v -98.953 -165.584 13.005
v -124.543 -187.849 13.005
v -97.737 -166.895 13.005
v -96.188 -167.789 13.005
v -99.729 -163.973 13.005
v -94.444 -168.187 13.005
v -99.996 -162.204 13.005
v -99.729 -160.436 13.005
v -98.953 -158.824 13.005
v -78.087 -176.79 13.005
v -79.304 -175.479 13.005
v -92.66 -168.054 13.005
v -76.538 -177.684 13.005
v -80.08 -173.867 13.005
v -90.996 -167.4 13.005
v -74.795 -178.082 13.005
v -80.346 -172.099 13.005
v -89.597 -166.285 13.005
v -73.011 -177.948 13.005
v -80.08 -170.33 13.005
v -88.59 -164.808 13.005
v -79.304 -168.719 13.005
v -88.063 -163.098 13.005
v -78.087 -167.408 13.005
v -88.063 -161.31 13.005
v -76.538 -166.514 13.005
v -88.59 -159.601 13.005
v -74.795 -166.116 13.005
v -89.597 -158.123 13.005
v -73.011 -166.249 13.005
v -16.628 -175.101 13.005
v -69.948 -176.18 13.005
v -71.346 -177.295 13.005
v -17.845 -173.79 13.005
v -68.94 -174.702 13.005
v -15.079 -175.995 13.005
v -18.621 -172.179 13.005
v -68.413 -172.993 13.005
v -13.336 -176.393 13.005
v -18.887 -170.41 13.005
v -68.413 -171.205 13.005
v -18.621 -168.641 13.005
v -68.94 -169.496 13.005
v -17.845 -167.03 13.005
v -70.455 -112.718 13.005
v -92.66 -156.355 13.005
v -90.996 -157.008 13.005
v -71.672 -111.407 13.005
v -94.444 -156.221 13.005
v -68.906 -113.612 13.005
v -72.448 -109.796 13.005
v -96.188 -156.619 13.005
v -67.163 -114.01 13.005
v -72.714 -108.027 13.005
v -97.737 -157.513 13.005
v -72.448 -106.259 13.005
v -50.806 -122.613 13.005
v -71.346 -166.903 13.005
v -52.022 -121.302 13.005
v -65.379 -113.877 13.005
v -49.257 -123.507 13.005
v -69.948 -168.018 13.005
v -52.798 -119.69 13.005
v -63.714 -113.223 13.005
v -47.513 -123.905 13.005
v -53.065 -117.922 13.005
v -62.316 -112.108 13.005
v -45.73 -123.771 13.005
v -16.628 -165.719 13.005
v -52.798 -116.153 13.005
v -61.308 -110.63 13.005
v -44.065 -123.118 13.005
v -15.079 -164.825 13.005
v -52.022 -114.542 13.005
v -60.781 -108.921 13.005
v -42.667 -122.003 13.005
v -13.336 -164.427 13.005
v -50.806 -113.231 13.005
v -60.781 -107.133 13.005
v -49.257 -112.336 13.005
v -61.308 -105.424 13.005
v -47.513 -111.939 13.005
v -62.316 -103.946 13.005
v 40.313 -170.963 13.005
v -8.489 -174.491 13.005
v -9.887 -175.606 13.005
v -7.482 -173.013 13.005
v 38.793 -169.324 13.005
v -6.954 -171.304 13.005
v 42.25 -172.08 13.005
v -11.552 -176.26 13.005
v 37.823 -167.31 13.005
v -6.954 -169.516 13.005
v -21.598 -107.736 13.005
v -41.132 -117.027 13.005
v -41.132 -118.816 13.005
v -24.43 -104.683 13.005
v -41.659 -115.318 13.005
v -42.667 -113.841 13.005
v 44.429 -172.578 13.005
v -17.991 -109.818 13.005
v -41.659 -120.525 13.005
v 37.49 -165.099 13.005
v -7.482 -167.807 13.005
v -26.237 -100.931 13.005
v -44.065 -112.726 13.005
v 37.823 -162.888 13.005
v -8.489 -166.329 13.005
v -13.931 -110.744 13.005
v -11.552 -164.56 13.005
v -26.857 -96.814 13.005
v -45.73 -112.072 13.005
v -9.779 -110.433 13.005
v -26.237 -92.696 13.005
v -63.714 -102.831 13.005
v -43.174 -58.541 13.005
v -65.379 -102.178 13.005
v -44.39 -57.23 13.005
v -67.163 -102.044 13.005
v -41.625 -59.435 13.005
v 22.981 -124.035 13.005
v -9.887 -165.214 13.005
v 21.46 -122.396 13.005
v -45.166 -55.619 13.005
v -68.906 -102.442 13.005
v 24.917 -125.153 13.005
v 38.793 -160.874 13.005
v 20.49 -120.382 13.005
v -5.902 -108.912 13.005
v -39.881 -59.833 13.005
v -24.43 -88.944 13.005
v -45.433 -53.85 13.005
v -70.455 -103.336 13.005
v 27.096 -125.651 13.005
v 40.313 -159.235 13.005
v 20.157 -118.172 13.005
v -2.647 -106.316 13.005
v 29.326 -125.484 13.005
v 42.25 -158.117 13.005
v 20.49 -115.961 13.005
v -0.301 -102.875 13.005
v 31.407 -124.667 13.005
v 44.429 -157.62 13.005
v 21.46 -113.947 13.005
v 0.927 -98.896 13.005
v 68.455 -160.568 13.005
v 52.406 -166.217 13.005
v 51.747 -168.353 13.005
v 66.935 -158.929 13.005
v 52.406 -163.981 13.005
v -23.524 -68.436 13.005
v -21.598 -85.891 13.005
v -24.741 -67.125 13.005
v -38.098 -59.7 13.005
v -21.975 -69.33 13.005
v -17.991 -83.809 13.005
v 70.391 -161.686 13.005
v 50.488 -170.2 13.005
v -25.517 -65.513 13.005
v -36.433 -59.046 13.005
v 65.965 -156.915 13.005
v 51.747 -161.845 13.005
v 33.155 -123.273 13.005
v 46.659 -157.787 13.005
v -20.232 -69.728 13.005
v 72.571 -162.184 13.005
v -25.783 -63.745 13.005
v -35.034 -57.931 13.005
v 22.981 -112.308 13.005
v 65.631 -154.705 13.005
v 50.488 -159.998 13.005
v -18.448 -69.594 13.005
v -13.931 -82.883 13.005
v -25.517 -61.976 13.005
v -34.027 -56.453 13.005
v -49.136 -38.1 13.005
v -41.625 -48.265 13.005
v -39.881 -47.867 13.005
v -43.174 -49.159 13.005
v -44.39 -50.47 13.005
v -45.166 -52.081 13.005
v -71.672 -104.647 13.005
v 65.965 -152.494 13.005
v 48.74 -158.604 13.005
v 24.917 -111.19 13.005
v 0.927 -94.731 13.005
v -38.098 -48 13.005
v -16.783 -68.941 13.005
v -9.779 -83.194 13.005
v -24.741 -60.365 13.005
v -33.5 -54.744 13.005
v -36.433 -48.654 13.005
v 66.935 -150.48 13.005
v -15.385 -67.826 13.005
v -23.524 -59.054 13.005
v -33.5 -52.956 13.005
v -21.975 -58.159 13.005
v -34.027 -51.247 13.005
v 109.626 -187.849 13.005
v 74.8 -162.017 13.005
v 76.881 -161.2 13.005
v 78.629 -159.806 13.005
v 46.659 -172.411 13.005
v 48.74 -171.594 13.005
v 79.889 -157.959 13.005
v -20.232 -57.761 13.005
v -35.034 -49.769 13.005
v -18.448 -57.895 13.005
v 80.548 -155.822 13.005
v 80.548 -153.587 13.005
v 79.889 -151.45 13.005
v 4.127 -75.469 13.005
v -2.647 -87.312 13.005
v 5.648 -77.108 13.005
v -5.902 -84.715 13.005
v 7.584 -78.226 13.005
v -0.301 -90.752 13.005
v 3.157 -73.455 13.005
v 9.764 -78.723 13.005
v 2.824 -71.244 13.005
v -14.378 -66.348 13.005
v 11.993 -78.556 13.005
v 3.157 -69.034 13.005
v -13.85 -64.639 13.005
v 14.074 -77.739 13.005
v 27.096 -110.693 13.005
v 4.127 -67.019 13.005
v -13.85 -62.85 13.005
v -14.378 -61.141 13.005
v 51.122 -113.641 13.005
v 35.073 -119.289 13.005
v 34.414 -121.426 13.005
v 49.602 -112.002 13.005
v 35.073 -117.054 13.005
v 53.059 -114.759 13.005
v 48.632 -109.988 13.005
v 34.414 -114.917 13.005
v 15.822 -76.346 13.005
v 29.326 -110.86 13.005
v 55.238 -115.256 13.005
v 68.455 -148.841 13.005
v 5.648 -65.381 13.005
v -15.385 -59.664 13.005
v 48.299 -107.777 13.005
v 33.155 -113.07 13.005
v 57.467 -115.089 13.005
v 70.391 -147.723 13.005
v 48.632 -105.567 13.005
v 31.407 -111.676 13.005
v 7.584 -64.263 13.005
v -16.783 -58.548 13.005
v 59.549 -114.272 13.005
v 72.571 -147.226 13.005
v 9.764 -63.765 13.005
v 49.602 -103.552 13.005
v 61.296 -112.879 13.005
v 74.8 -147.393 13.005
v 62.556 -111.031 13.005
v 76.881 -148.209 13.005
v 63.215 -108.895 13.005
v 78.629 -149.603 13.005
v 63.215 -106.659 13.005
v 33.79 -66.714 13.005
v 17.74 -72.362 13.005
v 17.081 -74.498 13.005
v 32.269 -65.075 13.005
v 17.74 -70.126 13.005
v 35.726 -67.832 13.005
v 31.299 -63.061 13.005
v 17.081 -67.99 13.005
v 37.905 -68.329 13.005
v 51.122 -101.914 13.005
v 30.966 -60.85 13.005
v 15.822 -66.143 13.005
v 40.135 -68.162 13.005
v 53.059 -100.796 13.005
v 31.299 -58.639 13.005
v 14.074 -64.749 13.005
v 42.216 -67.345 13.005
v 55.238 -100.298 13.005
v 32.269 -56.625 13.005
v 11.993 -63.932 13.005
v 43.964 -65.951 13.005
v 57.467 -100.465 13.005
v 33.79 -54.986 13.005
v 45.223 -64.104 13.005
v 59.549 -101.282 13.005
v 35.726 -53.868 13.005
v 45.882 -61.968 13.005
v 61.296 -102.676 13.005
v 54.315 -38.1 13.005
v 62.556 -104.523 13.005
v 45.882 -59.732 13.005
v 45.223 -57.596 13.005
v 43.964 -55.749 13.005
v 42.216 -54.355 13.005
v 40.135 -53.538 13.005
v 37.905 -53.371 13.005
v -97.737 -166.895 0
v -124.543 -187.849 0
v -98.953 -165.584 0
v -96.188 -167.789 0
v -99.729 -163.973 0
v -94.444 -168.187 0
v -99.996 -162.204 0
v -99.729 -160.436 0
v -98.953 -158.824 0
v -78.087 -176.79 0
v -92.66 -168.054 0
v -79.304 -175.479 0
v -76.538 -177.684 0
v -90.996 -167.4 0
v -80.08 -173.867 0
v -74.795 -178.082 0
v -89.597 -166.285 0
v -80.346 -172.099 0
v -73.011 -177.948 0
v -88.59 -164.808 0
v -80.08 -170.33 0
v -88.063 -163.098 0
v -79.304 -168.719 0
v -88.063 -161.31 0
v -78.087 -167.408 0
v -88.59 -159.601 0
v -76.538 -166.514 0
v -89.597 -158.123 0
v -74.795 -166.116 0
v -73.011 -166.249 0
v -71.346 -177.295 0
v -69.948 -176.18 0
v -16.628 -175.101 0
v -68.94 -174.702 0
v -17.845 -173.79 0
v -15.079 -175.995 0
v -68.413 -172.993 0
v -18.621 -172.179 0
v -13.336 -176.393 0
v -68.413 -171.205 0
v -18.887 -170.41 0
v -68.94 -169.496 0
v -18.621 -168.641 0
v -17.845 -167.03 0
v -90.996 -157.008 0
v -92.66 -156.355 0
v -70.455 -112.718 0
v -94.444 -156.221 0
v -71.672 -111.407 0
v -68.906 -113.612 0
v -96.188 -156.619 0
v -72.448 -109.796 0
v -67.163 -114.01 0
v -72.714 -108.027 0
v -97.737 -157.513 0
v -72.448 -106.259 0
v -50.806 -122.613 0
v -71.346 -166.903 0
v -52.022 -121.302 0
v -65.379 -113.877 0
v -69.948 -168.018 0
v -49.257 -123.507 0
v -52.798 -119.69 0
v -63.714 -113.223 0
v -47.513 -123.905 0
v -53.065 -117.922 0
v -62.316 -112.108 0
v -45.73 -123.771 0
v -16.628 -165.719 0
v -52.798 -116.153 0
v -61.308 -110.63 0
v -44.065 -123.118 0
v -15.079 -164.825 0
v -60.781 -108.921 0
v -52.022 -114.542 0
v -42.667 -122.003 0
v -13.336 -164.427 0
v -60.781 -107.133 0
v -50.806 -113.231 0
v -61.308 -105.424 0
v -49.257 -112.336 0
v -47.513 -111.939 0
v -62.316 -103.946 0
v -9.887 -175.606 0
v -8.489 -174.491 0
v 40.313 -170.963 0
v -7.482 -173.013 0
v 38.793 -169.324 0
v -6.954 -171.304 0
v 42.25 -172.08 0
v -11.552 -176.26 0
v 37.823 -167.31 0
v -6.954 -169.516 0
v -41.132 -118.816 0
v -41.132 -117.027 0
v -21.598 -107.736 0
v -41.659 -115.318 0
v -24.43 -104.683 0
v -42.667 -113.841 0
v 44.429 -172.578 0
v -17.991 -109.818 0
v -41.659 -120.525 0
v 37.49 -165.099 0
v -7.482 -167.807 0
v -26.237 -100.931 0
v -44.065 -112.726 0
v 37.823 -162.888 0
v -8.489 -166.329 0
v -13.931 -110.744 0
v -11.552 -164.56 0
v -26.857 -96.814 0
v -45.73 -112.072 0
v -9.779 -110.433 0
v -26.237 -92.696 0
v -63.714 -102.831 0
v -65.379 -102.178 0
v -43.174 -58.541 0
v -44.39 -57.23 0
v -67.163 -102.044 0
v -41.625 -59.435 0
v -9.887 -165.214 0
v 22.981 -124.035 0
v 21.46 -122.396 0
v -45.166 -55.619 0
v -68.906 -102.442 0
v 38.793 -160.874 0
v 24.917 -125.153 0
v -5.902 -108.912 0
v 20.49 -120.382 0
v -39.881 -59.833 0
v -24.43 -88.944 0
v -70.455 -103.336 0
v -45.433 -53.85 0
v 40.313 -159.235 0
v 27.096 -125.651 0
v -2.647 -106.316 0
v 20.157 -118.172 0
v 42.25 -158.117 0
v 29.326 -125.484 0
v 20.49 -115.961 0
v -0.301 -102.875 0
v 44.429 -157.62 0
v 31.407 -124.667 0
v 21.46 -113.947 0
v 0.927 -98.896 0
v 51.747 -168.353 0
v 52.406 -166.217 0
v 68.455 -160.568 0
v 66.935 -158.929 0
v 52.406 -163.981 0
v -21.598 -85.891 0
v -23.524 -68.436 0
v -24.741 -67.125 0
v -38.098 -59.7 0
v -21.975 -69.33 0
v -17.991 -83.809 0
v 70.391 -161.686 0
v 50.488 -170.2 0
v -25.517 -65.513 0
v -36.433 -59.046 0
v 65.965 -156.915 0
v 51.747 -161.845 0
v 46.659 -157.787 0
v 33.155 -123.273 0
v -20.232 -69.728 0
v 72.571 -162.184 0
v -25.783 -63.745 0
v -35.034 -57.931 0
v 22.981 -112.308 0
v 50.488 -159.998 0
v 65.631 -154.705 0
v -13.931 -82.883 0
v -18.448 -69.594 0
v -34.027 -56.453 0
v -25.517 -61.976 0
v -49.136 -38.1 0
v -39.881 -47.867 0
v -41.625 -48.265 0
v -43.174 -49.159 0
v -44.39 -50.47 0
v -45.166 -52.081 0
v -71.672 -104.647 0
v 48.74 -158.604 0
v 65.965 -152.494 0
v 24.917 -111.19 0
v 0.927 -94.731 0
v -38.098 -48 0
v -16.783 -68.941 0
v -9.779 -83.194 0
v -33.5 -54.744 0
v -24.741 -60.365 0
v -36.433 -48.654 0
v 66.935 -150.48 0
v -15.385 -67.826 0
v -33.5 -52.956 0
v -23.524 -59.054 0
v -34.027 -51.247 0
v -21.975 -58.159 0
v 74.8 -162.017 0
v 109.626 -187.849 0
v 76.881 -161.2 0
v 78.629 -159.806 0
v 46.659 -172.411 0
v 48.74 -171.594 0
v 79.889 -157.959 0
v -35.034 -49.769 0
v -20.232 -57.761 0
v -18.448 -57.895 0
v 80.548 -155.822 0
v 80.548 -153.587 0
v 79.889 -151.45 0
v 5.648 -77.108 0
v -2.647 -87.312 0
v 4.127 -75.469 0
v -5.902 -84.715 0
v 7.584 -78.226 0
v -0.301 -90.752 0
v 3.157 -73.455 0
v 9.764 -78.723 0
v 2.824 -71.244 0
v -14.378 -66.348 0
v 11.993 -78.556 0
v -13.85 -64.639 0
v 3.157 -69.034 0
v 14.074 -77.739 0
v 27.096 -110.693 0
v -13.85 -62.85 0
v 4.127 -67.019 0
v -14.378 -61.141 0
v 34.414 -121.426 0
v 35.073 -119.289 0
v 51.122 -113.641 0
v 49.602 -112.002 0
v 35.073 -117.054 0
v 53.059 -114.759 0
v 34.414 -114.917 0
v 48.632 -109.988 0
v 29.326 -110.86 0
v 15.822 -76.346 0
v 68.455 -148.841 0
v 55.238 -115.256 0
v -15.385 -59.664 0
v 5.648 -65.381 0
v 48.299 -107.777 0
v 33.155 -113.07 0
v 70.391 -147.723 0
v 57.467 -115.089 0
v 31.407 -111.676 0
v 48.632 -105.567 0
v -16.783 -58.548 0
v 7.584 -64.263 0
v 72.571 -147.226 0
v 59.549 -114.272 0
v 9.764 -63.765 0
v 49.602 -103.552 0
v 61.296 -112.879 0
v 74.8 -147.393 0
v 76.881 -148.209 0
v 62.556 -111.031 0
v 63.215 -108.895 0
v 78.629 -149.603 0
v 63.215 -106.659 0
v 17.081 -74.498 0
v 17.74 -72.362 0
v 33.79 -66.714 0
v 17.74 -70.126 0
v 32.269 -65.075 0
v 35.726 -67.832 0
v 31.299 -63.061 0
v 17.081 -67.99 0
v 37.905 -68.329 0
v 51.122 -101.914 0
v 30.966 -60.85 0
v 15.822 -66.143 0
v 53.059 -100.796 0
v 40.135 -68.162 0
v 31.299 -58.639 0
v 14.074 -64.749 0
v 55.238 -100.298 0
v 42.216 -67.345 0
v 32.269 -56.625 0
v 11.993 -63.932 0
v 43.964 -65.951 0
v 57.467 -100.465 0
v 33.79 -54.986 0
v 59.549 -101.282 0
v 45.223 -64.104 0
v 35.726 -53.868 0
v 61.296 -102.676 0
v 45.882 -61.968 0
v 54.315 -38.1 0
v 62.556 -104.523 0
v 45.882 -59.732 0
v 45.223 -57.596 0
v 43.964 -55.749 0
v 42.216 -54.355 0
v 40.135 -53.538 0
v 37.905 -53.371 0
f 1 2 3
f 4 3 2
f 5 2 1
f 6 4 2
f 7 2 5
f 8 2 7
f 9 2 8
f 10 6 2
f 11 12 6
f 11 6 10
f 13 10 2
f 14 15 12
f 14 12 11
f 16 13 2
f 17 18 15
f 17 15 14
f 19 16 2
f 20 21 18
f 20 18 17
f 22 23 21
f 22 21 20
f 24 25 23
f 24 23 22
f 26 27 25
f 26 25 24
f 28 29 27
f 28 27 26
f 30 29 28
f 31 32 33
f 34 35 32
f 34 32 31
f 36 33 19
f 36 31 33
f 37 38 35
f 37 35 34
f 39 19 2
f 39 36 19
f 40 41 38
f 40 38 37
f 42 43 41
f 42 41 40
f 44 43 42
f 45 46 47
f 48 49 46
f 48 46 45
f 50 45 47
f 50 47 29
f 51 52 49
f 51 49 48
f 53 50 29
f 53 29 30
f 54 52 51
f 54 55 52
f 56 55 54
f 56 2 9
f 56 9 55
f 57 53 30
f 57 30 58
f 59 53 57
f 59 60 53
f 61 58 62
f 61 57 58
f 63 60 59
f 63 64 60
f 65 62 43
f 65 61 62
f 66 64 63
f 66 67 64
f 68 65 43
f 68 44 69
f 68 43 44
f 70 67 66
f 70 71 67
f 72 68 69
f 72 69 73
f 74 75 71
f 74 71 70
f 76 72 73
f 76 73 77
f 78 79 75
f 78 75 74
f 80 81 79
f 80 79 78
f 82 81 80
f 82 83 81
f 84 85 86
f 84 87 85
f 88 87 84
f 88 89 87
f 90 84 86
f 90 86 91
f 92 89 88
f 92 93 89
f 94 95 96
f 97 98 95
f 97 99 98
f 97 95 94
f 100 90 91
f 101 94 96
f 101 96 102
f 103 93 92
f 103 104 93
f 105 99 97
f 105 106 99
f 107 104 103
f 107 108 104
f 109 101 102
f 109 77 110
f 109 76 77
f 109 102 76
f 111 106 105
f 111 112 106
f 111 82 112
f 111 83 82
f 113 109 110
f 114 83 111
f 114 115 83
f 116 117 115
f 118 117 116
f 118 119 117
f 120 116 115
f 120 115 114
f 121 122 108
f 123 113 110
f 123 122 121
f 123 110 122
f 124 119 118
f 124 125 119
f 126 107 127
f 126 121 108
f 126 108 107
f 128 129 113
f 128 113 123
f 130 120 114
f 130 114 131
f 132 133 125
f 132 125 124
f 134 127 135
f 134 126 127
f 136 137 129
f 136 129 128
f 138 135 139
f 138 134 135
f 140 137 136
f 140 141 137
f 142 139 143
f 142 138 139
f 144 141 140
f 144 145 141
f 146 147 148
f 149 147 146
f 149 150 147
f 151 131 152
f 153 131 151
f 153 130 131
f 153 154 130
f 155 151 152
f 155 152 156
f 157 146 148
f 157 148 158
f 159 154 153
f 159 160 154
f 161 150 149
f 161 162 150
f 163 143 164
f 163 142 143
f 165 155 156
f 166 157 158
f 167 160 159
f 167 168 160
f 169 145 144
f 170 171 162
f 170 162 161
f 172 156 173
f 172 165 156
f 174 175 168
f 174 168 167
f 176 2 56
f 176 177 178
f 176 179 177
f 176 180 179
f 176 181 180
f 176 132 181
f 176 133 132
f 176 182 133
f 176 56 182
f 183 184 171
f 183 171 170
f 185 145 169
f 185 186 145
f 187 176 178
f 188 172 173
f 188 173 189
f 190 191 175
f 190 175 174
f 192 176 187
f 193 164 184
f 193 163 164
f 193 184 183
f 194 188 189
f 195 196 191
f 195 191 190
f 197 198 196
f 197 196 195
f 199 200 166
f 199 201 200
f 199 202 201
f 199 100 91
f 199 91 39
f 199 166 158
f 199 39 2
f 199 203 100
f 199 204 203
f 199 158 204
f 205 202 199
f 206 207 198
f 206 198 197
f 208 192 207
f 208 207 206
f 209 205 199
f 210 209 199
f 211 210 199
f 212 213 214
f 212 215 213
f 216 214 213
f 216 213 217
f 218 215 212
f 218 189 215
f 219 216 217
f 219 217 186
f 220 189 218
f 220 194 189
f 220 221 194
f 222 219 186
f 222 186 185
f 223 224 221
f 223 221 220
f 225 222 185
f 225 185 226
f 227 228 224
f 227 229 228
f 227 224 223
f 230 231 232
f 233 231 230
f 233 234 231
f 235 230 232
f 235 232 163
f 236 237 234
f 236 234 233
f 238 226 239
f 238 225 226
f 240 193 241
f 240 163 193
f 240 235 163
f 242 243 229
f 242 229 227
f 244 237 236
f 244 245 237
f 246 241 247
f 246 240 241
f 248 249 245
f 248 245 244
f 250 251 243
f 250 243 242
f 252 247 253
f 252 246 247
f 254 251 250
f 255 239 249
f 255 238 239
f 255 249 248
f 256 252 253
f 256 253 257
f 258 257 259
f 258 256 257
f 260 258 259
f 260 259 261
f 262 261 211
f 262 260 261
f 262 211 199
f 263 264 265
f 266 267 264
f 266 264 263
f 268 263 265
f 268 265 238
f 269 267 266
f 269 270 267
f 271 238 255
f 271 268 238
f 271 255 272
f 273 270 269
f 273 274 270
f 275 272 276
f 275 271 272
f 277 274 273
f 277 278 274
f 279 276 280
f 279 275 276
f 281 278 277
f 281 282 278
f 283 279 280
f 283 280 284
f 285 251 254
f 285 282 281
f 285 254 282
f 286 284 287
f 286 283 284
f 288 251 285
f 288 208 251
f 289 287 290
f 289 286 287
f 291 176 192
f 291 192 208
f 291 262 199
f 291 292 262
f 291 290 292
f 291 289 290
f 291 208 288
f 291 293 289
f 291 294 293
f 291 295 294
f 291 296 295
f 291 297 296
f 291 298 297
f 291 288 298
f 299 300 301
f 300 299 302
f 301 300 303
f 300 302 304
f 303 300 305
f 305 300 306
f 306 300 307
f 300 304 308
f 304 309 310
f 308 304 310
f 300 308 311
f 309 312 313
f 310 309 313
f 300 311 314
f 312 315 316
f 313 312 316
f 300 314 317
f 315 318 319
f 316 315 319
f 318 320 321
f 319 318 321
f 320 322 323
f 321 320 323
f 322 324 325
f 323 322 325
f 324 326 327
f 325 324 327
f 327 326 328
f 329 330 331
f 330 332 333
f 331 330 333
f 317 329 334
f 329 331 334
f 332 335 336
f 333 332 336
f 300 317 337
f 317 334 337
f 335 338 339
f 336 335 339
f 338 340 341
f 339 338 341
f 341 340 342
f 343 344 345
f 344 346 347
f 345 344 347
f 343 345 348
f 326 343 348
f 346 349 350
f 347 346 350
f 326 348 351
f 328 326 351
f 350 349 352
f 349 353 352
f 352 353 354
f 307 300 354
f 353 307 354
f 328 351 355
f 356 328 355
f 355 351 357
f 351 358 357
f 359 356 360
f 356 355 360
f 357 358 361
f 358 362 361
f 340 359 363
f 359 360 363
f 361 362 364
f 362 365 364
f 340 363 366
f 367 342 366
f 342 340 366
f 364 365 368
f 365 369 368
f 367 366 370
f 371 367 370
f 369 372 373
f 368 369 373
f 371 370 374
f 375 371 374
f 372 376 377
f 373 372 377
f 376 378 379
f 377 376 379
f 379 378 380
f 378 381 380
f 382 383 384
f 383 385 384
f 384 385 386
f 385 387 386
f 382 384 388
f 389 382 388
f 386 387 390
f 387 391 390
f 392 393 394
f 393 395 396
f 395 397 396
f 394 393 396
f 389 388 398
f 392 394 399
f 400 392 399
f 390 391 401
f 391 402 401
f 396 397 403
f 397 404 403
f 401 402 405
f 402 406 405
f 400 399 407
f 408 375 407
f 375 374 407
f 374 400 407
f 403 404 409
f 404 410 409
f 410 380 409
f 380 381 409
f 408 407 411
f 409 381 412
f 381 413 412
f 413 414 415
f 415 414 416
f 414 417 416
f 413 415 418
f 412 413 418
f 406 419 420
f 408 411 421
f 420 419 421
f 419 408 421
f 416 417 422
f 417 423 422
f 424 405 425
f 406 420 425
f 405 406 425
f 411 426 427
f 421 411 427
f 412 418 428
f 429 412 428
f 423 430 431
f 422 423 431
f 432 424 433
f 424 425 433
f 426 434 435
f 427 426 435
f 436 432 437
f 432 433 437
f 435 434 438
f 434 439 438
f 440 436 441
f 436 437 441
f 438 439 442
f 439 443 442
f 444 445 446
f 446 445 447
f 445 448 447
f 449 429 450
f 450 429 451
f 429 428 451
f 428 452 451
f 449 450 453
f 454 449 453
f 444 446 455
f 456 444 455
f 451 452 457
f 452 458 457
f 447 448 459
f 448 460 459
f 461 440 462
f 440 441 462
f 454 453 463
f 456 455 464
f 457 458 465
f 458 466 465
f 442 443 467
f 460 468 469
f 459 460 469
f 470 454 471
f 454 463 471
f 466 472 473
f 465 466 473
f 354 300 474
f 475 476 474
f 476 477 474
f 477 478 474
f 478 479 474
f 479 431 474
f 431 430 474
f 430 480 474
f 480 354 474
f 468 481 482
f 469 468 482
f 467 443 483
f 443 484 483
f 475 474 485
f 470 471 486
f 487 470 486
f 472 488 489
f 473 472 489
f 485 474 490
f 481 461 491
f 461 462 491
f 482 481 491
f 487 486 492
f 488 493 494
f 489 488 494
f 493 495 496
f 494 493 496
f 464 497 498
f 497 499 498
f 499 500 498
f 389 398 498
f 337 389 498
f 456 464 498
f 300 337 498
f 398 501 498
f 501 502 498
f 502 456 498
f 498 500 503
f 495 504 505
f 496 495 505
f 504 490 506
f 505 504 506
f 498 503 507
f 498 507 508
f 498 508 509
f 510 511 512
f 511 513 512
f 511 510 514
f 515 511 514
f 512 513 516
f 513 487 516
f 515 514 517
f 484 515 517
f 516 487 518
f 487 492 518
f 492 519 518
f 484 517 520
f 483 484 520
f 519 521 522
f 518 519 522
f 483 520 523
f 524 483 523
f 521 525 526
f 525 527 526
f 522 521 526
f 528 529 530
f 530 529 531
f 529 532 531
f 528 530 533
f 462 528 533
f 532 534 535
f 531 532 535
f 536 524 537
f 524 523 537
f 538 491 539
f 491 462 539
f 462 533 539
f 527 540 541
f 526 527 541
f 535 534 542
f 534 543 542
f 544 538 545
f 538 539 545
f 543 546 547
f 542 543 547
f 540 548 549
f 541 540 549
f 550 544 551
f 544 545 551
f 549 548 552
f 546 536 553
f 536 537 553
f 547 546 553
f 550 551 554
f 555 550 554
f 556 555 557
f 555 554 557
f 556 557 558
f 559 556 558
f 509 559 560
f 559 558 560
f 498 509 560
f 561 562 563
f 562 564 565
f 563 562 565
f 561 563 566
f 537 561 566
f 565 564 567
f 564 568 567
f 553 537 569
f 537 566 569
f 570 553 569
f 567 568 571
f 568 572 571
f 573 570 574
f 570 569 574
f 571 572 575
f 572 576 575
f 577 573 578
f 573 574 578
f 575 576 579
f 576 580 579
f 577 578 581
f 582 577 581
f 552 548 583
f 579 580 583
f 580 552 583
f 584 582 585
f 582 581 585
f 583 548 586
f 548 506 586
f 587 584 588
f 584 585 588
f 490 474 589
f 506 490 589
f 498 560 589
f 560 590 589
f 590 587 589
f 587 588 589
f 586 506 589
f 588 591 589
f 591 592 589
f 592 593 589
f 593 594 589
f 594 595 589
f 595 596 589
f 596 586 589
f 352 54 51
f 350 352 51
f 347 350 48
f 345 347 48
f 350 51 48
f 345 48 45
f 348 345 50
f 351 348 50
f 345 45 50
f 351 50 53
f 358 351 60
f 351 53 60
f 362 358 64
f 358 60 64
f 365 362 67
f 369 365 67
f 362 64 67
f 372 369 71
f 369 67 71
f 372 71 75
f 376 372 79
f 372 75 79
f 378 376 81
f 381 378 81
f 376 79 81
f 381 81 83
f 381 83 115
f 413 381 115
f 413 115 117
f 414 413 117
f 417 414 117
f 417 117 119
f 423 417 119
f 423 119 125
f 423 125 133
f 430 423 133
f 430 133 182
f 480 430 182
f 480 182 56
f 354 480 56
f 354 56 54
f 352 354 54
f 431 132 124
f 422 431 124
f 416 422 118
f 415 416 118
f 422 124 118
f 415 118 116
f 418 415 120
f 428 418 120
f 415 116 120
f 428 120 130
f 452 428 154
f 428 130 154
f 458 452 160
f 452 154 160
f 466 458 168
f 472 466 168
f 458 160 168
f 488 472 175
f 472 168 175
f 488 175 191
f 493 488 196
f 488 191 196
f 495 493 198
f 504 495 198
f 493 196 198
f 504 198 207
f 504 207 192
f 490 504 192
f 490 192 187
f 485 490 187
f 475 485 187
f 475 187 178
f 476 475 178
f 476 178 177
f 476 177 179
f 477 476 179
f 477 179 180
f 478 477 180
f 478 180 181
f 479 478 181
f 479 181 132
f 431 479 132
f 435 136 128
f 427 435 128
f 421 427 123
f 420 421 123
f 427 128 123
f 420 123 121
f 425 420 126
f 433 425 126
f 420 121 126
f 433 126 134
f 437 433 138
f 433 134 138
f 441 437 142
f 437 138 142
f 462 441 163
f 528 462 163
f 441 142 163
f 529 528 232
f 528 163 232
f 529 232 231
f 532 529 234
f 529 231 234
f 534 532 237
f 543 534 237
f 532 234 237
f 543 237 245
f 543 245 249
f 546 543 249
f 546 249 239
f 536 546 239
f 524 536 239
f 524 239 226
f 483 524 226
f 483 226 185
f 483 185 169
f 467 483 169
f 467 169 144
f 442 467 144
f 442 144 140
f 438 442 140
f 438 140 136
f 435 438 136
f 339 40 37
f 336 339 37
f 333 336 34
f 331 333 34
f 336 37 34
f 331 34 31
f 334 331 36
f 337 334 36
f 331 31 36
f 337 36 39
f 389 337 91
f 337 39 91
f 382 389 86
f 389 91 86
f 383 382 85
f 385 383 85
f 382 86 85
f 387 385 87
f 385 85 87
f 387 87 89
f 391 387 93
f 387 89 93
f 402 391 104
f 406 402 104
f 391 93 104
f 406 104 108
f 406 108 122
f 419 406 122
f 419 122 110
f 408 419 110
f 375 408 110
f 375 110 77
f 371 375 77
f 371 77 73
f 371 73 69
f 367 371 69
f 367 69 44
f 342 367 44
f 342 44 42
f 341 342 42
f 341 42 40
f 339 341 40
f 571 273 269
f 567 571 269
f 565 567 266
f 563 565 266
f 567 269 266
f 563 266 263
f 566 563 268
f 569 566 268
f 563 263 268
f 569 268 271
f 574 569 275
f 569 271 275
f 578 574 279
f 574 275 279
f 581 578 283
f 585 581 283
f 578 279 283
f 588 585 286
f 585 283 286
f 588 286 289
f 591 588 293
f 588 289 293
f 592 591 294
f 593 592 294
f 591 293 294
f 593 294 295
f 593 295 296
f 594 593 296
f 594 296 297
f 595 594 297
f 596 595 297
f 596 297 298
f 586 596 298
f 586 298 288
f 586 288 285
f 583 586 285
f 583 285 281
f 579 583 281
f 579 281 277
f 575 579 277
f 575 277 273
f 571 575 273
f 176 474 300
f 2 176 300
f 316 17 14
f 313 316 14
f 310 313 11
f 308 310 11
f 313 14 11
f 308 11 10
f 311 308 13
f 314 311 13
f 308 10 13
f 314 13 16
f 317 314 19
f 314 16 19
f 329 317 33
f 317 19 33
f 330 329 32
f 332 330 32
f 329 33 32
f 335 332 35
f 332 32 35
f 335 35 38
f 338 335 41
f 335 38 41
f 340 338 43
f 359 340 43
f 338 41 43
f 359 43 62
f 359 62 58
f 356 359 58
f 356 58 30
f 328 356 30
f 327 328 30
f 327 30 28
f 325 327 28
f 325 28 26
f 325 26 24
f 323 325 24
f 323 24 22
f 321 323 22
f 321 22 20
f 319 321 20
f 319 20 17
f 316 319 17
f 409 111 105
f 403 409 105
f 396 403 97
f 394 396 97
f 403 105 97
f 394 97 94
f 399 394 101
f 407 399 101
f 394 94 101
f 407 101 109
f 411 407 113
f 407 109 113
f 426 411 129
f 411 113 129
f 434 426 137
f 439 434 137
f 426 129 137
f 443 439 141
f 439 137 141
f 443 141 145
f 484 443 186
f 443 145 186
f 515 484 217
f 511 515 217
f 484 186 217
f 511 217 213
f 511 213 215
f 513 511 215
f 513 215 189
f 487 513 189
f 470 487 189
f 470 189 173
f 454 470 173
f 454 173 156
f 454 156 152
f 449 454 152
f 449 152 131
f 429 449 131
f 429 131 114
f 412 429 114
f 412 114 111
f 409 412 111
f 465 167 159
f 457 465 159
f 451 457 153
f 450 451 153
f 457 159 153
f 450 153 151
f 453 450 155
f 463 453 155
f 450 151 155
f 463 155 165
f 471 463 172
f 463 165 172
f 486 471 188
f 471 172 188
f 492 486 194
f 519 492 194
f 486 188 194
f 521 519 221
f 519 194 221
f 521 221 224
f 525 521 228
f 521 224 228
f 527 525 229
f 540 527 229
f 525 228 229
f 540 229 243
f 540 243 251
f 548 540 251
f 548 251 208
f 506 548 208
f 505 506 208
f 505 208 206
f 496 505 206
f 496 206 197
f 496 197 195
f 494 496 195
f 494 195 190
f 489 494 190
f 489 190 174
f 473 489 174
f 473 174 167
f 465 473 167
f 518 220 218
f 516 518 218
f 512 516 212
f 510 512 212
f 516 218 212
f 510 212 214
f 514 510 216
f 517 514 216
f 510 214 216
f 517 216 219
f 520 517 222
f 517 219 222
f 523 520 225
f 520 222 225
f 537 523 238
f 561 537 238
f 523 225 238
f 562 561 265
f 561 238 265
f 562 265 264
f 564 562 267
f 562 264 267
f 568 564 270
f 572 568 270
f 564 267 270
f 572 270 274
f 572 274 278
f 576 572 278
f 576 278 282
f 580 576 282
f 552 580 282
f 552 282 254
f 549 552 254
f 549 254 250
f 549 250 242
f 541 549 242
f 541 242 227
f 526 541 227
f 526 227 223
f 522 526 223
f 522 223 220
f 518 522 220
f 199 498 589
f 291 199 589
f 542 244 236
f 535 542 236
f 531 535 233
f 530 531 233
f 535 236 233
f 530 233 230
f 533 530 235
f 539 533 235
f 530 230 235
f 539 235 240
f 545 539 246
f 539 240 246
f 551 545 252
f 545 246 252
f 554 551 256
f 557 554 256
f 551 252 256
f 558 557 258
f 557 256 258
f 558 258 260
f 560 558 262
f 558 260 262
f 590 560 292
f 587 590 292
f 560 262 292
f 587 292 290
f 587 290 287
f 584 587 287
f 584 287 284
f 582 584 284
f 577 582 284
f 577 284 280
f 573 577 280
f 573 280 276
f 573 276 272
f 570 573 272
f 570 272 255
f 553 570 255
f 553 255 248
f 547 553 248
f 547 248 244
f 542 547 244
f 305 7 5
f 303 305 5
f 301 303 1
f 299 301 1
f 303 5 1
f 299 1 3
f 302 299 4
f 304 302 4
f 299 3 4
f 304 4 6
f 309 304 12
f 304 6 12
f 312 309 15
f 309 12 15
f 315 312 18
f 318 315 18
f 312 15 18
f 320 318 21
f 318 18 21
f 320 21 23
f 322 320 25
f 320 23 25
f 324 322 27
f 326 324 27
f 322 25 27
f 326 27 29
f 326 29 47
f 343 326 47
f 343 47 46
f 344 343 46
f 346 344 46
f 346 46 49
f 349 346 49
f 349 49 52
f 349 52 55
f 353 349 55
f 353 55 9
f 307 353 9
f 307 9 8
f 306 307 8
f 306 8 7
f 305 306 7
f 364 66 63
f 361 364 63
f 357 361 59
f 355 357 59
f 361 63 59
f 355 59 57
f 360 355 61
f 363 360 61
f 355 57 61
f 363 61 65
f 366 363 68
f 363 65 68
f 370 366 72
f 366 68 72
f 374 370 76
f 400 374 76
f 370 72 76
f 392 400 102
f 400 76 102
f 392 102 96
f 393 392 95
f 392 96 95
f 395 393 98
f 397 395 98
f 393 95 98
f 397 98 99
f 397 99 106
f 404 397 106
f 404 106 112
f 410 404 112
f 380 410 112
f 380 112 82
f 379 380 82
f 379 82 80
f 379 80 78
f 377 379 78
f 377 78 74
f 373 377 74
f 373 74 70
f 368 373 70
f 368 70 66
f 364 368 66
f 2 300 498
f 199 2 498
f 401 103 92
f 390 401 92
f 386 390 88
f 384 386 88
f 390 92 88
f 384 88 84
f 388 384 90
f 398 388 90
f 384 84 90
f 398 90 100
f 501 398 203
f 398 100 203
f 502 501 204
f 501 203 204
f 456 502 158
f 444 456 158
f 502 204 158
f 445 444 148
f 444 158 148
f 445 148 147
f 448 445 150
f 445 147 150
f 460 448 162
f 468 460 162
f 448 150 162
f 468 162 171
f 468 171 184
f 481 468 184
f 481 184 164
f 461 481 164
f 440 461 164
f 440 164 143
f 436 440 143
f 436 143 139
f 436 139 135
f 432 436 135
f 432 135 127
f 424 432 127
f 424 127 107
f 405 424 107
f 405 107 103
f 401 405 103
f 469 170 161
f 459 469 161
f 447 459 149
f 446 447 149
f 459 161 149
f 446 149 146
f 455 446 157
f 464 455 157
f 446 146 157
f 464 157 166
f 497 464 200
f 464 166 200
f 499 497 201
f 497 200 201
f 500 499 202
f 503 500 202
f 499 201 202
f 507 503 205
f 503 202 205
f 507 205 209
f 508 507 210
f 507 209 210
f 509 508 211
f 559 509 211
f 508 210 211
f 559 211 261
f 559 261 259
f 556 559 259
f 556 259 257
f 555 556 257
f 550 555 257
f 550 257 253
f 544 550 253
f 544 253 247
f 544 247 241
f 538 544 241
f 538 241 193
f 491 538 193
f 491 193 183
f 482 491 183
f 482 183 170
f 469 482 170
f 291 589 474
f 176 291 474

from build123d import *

# Parameters (mm, degrees)
F3_DEPTH = 13.0048
F4_D     = 15
F5_D     = 12
F6_D     = 27.94


with BuildPart() as f3:
    # F2 (on Top) → F3 (new body)
    with BuildSketch(Plane.XY):
        Polygon((54.3151245746, -38.1), (-49.1357887106, -38.1), (-124.5434206745, -187.848847558), (109.6256415023, -187.848847558), align=None)
    extrude(amount=F3_DEPTH)

    # F4 (through all)
    with Locations(Plane(origin=(0, 0, 0), x_dir=(1, 0, 0), z_dir=(0, 0, -1))):
        with Locations((38.4657377694, 60.85), (10.3239816143, 71.2443042339), (27.6568138595, 118.1715758959), (55.7985700146, 107.777271662), (44.9896461047, 165.098847558), (73.1314022598, 154.7045433241)):
            Hole(F4_D / 2)

    # F5 (through all)
    with Locations(Plane(origin=(0, 0, 0), x_dir=(1, 0, 0), z_dir=(0, 0, -1))):
        with Locations((-19.7833501507, 63.7446313346), (-39.4326827285, 53.85), (-66.7141442955, 108.0271081117), (-47.0648117177, 117.9217394463), (-74.3462732846, 172.098847558), (-93.9956058624, 162.2042162234), (-12.8873561721, 170.4100188799)):
            Hole(F5_D / 2)

    # F6 (through all)
    with Locations(Plane(origin=(0, 0, 0), x_dir=(1, 0, 0), z_dir=(0, 0, -1))):
        with Locations((-12.8873561721, 96.8135188799)):
            Hole(F6_D / 2)


solid = f3.part
